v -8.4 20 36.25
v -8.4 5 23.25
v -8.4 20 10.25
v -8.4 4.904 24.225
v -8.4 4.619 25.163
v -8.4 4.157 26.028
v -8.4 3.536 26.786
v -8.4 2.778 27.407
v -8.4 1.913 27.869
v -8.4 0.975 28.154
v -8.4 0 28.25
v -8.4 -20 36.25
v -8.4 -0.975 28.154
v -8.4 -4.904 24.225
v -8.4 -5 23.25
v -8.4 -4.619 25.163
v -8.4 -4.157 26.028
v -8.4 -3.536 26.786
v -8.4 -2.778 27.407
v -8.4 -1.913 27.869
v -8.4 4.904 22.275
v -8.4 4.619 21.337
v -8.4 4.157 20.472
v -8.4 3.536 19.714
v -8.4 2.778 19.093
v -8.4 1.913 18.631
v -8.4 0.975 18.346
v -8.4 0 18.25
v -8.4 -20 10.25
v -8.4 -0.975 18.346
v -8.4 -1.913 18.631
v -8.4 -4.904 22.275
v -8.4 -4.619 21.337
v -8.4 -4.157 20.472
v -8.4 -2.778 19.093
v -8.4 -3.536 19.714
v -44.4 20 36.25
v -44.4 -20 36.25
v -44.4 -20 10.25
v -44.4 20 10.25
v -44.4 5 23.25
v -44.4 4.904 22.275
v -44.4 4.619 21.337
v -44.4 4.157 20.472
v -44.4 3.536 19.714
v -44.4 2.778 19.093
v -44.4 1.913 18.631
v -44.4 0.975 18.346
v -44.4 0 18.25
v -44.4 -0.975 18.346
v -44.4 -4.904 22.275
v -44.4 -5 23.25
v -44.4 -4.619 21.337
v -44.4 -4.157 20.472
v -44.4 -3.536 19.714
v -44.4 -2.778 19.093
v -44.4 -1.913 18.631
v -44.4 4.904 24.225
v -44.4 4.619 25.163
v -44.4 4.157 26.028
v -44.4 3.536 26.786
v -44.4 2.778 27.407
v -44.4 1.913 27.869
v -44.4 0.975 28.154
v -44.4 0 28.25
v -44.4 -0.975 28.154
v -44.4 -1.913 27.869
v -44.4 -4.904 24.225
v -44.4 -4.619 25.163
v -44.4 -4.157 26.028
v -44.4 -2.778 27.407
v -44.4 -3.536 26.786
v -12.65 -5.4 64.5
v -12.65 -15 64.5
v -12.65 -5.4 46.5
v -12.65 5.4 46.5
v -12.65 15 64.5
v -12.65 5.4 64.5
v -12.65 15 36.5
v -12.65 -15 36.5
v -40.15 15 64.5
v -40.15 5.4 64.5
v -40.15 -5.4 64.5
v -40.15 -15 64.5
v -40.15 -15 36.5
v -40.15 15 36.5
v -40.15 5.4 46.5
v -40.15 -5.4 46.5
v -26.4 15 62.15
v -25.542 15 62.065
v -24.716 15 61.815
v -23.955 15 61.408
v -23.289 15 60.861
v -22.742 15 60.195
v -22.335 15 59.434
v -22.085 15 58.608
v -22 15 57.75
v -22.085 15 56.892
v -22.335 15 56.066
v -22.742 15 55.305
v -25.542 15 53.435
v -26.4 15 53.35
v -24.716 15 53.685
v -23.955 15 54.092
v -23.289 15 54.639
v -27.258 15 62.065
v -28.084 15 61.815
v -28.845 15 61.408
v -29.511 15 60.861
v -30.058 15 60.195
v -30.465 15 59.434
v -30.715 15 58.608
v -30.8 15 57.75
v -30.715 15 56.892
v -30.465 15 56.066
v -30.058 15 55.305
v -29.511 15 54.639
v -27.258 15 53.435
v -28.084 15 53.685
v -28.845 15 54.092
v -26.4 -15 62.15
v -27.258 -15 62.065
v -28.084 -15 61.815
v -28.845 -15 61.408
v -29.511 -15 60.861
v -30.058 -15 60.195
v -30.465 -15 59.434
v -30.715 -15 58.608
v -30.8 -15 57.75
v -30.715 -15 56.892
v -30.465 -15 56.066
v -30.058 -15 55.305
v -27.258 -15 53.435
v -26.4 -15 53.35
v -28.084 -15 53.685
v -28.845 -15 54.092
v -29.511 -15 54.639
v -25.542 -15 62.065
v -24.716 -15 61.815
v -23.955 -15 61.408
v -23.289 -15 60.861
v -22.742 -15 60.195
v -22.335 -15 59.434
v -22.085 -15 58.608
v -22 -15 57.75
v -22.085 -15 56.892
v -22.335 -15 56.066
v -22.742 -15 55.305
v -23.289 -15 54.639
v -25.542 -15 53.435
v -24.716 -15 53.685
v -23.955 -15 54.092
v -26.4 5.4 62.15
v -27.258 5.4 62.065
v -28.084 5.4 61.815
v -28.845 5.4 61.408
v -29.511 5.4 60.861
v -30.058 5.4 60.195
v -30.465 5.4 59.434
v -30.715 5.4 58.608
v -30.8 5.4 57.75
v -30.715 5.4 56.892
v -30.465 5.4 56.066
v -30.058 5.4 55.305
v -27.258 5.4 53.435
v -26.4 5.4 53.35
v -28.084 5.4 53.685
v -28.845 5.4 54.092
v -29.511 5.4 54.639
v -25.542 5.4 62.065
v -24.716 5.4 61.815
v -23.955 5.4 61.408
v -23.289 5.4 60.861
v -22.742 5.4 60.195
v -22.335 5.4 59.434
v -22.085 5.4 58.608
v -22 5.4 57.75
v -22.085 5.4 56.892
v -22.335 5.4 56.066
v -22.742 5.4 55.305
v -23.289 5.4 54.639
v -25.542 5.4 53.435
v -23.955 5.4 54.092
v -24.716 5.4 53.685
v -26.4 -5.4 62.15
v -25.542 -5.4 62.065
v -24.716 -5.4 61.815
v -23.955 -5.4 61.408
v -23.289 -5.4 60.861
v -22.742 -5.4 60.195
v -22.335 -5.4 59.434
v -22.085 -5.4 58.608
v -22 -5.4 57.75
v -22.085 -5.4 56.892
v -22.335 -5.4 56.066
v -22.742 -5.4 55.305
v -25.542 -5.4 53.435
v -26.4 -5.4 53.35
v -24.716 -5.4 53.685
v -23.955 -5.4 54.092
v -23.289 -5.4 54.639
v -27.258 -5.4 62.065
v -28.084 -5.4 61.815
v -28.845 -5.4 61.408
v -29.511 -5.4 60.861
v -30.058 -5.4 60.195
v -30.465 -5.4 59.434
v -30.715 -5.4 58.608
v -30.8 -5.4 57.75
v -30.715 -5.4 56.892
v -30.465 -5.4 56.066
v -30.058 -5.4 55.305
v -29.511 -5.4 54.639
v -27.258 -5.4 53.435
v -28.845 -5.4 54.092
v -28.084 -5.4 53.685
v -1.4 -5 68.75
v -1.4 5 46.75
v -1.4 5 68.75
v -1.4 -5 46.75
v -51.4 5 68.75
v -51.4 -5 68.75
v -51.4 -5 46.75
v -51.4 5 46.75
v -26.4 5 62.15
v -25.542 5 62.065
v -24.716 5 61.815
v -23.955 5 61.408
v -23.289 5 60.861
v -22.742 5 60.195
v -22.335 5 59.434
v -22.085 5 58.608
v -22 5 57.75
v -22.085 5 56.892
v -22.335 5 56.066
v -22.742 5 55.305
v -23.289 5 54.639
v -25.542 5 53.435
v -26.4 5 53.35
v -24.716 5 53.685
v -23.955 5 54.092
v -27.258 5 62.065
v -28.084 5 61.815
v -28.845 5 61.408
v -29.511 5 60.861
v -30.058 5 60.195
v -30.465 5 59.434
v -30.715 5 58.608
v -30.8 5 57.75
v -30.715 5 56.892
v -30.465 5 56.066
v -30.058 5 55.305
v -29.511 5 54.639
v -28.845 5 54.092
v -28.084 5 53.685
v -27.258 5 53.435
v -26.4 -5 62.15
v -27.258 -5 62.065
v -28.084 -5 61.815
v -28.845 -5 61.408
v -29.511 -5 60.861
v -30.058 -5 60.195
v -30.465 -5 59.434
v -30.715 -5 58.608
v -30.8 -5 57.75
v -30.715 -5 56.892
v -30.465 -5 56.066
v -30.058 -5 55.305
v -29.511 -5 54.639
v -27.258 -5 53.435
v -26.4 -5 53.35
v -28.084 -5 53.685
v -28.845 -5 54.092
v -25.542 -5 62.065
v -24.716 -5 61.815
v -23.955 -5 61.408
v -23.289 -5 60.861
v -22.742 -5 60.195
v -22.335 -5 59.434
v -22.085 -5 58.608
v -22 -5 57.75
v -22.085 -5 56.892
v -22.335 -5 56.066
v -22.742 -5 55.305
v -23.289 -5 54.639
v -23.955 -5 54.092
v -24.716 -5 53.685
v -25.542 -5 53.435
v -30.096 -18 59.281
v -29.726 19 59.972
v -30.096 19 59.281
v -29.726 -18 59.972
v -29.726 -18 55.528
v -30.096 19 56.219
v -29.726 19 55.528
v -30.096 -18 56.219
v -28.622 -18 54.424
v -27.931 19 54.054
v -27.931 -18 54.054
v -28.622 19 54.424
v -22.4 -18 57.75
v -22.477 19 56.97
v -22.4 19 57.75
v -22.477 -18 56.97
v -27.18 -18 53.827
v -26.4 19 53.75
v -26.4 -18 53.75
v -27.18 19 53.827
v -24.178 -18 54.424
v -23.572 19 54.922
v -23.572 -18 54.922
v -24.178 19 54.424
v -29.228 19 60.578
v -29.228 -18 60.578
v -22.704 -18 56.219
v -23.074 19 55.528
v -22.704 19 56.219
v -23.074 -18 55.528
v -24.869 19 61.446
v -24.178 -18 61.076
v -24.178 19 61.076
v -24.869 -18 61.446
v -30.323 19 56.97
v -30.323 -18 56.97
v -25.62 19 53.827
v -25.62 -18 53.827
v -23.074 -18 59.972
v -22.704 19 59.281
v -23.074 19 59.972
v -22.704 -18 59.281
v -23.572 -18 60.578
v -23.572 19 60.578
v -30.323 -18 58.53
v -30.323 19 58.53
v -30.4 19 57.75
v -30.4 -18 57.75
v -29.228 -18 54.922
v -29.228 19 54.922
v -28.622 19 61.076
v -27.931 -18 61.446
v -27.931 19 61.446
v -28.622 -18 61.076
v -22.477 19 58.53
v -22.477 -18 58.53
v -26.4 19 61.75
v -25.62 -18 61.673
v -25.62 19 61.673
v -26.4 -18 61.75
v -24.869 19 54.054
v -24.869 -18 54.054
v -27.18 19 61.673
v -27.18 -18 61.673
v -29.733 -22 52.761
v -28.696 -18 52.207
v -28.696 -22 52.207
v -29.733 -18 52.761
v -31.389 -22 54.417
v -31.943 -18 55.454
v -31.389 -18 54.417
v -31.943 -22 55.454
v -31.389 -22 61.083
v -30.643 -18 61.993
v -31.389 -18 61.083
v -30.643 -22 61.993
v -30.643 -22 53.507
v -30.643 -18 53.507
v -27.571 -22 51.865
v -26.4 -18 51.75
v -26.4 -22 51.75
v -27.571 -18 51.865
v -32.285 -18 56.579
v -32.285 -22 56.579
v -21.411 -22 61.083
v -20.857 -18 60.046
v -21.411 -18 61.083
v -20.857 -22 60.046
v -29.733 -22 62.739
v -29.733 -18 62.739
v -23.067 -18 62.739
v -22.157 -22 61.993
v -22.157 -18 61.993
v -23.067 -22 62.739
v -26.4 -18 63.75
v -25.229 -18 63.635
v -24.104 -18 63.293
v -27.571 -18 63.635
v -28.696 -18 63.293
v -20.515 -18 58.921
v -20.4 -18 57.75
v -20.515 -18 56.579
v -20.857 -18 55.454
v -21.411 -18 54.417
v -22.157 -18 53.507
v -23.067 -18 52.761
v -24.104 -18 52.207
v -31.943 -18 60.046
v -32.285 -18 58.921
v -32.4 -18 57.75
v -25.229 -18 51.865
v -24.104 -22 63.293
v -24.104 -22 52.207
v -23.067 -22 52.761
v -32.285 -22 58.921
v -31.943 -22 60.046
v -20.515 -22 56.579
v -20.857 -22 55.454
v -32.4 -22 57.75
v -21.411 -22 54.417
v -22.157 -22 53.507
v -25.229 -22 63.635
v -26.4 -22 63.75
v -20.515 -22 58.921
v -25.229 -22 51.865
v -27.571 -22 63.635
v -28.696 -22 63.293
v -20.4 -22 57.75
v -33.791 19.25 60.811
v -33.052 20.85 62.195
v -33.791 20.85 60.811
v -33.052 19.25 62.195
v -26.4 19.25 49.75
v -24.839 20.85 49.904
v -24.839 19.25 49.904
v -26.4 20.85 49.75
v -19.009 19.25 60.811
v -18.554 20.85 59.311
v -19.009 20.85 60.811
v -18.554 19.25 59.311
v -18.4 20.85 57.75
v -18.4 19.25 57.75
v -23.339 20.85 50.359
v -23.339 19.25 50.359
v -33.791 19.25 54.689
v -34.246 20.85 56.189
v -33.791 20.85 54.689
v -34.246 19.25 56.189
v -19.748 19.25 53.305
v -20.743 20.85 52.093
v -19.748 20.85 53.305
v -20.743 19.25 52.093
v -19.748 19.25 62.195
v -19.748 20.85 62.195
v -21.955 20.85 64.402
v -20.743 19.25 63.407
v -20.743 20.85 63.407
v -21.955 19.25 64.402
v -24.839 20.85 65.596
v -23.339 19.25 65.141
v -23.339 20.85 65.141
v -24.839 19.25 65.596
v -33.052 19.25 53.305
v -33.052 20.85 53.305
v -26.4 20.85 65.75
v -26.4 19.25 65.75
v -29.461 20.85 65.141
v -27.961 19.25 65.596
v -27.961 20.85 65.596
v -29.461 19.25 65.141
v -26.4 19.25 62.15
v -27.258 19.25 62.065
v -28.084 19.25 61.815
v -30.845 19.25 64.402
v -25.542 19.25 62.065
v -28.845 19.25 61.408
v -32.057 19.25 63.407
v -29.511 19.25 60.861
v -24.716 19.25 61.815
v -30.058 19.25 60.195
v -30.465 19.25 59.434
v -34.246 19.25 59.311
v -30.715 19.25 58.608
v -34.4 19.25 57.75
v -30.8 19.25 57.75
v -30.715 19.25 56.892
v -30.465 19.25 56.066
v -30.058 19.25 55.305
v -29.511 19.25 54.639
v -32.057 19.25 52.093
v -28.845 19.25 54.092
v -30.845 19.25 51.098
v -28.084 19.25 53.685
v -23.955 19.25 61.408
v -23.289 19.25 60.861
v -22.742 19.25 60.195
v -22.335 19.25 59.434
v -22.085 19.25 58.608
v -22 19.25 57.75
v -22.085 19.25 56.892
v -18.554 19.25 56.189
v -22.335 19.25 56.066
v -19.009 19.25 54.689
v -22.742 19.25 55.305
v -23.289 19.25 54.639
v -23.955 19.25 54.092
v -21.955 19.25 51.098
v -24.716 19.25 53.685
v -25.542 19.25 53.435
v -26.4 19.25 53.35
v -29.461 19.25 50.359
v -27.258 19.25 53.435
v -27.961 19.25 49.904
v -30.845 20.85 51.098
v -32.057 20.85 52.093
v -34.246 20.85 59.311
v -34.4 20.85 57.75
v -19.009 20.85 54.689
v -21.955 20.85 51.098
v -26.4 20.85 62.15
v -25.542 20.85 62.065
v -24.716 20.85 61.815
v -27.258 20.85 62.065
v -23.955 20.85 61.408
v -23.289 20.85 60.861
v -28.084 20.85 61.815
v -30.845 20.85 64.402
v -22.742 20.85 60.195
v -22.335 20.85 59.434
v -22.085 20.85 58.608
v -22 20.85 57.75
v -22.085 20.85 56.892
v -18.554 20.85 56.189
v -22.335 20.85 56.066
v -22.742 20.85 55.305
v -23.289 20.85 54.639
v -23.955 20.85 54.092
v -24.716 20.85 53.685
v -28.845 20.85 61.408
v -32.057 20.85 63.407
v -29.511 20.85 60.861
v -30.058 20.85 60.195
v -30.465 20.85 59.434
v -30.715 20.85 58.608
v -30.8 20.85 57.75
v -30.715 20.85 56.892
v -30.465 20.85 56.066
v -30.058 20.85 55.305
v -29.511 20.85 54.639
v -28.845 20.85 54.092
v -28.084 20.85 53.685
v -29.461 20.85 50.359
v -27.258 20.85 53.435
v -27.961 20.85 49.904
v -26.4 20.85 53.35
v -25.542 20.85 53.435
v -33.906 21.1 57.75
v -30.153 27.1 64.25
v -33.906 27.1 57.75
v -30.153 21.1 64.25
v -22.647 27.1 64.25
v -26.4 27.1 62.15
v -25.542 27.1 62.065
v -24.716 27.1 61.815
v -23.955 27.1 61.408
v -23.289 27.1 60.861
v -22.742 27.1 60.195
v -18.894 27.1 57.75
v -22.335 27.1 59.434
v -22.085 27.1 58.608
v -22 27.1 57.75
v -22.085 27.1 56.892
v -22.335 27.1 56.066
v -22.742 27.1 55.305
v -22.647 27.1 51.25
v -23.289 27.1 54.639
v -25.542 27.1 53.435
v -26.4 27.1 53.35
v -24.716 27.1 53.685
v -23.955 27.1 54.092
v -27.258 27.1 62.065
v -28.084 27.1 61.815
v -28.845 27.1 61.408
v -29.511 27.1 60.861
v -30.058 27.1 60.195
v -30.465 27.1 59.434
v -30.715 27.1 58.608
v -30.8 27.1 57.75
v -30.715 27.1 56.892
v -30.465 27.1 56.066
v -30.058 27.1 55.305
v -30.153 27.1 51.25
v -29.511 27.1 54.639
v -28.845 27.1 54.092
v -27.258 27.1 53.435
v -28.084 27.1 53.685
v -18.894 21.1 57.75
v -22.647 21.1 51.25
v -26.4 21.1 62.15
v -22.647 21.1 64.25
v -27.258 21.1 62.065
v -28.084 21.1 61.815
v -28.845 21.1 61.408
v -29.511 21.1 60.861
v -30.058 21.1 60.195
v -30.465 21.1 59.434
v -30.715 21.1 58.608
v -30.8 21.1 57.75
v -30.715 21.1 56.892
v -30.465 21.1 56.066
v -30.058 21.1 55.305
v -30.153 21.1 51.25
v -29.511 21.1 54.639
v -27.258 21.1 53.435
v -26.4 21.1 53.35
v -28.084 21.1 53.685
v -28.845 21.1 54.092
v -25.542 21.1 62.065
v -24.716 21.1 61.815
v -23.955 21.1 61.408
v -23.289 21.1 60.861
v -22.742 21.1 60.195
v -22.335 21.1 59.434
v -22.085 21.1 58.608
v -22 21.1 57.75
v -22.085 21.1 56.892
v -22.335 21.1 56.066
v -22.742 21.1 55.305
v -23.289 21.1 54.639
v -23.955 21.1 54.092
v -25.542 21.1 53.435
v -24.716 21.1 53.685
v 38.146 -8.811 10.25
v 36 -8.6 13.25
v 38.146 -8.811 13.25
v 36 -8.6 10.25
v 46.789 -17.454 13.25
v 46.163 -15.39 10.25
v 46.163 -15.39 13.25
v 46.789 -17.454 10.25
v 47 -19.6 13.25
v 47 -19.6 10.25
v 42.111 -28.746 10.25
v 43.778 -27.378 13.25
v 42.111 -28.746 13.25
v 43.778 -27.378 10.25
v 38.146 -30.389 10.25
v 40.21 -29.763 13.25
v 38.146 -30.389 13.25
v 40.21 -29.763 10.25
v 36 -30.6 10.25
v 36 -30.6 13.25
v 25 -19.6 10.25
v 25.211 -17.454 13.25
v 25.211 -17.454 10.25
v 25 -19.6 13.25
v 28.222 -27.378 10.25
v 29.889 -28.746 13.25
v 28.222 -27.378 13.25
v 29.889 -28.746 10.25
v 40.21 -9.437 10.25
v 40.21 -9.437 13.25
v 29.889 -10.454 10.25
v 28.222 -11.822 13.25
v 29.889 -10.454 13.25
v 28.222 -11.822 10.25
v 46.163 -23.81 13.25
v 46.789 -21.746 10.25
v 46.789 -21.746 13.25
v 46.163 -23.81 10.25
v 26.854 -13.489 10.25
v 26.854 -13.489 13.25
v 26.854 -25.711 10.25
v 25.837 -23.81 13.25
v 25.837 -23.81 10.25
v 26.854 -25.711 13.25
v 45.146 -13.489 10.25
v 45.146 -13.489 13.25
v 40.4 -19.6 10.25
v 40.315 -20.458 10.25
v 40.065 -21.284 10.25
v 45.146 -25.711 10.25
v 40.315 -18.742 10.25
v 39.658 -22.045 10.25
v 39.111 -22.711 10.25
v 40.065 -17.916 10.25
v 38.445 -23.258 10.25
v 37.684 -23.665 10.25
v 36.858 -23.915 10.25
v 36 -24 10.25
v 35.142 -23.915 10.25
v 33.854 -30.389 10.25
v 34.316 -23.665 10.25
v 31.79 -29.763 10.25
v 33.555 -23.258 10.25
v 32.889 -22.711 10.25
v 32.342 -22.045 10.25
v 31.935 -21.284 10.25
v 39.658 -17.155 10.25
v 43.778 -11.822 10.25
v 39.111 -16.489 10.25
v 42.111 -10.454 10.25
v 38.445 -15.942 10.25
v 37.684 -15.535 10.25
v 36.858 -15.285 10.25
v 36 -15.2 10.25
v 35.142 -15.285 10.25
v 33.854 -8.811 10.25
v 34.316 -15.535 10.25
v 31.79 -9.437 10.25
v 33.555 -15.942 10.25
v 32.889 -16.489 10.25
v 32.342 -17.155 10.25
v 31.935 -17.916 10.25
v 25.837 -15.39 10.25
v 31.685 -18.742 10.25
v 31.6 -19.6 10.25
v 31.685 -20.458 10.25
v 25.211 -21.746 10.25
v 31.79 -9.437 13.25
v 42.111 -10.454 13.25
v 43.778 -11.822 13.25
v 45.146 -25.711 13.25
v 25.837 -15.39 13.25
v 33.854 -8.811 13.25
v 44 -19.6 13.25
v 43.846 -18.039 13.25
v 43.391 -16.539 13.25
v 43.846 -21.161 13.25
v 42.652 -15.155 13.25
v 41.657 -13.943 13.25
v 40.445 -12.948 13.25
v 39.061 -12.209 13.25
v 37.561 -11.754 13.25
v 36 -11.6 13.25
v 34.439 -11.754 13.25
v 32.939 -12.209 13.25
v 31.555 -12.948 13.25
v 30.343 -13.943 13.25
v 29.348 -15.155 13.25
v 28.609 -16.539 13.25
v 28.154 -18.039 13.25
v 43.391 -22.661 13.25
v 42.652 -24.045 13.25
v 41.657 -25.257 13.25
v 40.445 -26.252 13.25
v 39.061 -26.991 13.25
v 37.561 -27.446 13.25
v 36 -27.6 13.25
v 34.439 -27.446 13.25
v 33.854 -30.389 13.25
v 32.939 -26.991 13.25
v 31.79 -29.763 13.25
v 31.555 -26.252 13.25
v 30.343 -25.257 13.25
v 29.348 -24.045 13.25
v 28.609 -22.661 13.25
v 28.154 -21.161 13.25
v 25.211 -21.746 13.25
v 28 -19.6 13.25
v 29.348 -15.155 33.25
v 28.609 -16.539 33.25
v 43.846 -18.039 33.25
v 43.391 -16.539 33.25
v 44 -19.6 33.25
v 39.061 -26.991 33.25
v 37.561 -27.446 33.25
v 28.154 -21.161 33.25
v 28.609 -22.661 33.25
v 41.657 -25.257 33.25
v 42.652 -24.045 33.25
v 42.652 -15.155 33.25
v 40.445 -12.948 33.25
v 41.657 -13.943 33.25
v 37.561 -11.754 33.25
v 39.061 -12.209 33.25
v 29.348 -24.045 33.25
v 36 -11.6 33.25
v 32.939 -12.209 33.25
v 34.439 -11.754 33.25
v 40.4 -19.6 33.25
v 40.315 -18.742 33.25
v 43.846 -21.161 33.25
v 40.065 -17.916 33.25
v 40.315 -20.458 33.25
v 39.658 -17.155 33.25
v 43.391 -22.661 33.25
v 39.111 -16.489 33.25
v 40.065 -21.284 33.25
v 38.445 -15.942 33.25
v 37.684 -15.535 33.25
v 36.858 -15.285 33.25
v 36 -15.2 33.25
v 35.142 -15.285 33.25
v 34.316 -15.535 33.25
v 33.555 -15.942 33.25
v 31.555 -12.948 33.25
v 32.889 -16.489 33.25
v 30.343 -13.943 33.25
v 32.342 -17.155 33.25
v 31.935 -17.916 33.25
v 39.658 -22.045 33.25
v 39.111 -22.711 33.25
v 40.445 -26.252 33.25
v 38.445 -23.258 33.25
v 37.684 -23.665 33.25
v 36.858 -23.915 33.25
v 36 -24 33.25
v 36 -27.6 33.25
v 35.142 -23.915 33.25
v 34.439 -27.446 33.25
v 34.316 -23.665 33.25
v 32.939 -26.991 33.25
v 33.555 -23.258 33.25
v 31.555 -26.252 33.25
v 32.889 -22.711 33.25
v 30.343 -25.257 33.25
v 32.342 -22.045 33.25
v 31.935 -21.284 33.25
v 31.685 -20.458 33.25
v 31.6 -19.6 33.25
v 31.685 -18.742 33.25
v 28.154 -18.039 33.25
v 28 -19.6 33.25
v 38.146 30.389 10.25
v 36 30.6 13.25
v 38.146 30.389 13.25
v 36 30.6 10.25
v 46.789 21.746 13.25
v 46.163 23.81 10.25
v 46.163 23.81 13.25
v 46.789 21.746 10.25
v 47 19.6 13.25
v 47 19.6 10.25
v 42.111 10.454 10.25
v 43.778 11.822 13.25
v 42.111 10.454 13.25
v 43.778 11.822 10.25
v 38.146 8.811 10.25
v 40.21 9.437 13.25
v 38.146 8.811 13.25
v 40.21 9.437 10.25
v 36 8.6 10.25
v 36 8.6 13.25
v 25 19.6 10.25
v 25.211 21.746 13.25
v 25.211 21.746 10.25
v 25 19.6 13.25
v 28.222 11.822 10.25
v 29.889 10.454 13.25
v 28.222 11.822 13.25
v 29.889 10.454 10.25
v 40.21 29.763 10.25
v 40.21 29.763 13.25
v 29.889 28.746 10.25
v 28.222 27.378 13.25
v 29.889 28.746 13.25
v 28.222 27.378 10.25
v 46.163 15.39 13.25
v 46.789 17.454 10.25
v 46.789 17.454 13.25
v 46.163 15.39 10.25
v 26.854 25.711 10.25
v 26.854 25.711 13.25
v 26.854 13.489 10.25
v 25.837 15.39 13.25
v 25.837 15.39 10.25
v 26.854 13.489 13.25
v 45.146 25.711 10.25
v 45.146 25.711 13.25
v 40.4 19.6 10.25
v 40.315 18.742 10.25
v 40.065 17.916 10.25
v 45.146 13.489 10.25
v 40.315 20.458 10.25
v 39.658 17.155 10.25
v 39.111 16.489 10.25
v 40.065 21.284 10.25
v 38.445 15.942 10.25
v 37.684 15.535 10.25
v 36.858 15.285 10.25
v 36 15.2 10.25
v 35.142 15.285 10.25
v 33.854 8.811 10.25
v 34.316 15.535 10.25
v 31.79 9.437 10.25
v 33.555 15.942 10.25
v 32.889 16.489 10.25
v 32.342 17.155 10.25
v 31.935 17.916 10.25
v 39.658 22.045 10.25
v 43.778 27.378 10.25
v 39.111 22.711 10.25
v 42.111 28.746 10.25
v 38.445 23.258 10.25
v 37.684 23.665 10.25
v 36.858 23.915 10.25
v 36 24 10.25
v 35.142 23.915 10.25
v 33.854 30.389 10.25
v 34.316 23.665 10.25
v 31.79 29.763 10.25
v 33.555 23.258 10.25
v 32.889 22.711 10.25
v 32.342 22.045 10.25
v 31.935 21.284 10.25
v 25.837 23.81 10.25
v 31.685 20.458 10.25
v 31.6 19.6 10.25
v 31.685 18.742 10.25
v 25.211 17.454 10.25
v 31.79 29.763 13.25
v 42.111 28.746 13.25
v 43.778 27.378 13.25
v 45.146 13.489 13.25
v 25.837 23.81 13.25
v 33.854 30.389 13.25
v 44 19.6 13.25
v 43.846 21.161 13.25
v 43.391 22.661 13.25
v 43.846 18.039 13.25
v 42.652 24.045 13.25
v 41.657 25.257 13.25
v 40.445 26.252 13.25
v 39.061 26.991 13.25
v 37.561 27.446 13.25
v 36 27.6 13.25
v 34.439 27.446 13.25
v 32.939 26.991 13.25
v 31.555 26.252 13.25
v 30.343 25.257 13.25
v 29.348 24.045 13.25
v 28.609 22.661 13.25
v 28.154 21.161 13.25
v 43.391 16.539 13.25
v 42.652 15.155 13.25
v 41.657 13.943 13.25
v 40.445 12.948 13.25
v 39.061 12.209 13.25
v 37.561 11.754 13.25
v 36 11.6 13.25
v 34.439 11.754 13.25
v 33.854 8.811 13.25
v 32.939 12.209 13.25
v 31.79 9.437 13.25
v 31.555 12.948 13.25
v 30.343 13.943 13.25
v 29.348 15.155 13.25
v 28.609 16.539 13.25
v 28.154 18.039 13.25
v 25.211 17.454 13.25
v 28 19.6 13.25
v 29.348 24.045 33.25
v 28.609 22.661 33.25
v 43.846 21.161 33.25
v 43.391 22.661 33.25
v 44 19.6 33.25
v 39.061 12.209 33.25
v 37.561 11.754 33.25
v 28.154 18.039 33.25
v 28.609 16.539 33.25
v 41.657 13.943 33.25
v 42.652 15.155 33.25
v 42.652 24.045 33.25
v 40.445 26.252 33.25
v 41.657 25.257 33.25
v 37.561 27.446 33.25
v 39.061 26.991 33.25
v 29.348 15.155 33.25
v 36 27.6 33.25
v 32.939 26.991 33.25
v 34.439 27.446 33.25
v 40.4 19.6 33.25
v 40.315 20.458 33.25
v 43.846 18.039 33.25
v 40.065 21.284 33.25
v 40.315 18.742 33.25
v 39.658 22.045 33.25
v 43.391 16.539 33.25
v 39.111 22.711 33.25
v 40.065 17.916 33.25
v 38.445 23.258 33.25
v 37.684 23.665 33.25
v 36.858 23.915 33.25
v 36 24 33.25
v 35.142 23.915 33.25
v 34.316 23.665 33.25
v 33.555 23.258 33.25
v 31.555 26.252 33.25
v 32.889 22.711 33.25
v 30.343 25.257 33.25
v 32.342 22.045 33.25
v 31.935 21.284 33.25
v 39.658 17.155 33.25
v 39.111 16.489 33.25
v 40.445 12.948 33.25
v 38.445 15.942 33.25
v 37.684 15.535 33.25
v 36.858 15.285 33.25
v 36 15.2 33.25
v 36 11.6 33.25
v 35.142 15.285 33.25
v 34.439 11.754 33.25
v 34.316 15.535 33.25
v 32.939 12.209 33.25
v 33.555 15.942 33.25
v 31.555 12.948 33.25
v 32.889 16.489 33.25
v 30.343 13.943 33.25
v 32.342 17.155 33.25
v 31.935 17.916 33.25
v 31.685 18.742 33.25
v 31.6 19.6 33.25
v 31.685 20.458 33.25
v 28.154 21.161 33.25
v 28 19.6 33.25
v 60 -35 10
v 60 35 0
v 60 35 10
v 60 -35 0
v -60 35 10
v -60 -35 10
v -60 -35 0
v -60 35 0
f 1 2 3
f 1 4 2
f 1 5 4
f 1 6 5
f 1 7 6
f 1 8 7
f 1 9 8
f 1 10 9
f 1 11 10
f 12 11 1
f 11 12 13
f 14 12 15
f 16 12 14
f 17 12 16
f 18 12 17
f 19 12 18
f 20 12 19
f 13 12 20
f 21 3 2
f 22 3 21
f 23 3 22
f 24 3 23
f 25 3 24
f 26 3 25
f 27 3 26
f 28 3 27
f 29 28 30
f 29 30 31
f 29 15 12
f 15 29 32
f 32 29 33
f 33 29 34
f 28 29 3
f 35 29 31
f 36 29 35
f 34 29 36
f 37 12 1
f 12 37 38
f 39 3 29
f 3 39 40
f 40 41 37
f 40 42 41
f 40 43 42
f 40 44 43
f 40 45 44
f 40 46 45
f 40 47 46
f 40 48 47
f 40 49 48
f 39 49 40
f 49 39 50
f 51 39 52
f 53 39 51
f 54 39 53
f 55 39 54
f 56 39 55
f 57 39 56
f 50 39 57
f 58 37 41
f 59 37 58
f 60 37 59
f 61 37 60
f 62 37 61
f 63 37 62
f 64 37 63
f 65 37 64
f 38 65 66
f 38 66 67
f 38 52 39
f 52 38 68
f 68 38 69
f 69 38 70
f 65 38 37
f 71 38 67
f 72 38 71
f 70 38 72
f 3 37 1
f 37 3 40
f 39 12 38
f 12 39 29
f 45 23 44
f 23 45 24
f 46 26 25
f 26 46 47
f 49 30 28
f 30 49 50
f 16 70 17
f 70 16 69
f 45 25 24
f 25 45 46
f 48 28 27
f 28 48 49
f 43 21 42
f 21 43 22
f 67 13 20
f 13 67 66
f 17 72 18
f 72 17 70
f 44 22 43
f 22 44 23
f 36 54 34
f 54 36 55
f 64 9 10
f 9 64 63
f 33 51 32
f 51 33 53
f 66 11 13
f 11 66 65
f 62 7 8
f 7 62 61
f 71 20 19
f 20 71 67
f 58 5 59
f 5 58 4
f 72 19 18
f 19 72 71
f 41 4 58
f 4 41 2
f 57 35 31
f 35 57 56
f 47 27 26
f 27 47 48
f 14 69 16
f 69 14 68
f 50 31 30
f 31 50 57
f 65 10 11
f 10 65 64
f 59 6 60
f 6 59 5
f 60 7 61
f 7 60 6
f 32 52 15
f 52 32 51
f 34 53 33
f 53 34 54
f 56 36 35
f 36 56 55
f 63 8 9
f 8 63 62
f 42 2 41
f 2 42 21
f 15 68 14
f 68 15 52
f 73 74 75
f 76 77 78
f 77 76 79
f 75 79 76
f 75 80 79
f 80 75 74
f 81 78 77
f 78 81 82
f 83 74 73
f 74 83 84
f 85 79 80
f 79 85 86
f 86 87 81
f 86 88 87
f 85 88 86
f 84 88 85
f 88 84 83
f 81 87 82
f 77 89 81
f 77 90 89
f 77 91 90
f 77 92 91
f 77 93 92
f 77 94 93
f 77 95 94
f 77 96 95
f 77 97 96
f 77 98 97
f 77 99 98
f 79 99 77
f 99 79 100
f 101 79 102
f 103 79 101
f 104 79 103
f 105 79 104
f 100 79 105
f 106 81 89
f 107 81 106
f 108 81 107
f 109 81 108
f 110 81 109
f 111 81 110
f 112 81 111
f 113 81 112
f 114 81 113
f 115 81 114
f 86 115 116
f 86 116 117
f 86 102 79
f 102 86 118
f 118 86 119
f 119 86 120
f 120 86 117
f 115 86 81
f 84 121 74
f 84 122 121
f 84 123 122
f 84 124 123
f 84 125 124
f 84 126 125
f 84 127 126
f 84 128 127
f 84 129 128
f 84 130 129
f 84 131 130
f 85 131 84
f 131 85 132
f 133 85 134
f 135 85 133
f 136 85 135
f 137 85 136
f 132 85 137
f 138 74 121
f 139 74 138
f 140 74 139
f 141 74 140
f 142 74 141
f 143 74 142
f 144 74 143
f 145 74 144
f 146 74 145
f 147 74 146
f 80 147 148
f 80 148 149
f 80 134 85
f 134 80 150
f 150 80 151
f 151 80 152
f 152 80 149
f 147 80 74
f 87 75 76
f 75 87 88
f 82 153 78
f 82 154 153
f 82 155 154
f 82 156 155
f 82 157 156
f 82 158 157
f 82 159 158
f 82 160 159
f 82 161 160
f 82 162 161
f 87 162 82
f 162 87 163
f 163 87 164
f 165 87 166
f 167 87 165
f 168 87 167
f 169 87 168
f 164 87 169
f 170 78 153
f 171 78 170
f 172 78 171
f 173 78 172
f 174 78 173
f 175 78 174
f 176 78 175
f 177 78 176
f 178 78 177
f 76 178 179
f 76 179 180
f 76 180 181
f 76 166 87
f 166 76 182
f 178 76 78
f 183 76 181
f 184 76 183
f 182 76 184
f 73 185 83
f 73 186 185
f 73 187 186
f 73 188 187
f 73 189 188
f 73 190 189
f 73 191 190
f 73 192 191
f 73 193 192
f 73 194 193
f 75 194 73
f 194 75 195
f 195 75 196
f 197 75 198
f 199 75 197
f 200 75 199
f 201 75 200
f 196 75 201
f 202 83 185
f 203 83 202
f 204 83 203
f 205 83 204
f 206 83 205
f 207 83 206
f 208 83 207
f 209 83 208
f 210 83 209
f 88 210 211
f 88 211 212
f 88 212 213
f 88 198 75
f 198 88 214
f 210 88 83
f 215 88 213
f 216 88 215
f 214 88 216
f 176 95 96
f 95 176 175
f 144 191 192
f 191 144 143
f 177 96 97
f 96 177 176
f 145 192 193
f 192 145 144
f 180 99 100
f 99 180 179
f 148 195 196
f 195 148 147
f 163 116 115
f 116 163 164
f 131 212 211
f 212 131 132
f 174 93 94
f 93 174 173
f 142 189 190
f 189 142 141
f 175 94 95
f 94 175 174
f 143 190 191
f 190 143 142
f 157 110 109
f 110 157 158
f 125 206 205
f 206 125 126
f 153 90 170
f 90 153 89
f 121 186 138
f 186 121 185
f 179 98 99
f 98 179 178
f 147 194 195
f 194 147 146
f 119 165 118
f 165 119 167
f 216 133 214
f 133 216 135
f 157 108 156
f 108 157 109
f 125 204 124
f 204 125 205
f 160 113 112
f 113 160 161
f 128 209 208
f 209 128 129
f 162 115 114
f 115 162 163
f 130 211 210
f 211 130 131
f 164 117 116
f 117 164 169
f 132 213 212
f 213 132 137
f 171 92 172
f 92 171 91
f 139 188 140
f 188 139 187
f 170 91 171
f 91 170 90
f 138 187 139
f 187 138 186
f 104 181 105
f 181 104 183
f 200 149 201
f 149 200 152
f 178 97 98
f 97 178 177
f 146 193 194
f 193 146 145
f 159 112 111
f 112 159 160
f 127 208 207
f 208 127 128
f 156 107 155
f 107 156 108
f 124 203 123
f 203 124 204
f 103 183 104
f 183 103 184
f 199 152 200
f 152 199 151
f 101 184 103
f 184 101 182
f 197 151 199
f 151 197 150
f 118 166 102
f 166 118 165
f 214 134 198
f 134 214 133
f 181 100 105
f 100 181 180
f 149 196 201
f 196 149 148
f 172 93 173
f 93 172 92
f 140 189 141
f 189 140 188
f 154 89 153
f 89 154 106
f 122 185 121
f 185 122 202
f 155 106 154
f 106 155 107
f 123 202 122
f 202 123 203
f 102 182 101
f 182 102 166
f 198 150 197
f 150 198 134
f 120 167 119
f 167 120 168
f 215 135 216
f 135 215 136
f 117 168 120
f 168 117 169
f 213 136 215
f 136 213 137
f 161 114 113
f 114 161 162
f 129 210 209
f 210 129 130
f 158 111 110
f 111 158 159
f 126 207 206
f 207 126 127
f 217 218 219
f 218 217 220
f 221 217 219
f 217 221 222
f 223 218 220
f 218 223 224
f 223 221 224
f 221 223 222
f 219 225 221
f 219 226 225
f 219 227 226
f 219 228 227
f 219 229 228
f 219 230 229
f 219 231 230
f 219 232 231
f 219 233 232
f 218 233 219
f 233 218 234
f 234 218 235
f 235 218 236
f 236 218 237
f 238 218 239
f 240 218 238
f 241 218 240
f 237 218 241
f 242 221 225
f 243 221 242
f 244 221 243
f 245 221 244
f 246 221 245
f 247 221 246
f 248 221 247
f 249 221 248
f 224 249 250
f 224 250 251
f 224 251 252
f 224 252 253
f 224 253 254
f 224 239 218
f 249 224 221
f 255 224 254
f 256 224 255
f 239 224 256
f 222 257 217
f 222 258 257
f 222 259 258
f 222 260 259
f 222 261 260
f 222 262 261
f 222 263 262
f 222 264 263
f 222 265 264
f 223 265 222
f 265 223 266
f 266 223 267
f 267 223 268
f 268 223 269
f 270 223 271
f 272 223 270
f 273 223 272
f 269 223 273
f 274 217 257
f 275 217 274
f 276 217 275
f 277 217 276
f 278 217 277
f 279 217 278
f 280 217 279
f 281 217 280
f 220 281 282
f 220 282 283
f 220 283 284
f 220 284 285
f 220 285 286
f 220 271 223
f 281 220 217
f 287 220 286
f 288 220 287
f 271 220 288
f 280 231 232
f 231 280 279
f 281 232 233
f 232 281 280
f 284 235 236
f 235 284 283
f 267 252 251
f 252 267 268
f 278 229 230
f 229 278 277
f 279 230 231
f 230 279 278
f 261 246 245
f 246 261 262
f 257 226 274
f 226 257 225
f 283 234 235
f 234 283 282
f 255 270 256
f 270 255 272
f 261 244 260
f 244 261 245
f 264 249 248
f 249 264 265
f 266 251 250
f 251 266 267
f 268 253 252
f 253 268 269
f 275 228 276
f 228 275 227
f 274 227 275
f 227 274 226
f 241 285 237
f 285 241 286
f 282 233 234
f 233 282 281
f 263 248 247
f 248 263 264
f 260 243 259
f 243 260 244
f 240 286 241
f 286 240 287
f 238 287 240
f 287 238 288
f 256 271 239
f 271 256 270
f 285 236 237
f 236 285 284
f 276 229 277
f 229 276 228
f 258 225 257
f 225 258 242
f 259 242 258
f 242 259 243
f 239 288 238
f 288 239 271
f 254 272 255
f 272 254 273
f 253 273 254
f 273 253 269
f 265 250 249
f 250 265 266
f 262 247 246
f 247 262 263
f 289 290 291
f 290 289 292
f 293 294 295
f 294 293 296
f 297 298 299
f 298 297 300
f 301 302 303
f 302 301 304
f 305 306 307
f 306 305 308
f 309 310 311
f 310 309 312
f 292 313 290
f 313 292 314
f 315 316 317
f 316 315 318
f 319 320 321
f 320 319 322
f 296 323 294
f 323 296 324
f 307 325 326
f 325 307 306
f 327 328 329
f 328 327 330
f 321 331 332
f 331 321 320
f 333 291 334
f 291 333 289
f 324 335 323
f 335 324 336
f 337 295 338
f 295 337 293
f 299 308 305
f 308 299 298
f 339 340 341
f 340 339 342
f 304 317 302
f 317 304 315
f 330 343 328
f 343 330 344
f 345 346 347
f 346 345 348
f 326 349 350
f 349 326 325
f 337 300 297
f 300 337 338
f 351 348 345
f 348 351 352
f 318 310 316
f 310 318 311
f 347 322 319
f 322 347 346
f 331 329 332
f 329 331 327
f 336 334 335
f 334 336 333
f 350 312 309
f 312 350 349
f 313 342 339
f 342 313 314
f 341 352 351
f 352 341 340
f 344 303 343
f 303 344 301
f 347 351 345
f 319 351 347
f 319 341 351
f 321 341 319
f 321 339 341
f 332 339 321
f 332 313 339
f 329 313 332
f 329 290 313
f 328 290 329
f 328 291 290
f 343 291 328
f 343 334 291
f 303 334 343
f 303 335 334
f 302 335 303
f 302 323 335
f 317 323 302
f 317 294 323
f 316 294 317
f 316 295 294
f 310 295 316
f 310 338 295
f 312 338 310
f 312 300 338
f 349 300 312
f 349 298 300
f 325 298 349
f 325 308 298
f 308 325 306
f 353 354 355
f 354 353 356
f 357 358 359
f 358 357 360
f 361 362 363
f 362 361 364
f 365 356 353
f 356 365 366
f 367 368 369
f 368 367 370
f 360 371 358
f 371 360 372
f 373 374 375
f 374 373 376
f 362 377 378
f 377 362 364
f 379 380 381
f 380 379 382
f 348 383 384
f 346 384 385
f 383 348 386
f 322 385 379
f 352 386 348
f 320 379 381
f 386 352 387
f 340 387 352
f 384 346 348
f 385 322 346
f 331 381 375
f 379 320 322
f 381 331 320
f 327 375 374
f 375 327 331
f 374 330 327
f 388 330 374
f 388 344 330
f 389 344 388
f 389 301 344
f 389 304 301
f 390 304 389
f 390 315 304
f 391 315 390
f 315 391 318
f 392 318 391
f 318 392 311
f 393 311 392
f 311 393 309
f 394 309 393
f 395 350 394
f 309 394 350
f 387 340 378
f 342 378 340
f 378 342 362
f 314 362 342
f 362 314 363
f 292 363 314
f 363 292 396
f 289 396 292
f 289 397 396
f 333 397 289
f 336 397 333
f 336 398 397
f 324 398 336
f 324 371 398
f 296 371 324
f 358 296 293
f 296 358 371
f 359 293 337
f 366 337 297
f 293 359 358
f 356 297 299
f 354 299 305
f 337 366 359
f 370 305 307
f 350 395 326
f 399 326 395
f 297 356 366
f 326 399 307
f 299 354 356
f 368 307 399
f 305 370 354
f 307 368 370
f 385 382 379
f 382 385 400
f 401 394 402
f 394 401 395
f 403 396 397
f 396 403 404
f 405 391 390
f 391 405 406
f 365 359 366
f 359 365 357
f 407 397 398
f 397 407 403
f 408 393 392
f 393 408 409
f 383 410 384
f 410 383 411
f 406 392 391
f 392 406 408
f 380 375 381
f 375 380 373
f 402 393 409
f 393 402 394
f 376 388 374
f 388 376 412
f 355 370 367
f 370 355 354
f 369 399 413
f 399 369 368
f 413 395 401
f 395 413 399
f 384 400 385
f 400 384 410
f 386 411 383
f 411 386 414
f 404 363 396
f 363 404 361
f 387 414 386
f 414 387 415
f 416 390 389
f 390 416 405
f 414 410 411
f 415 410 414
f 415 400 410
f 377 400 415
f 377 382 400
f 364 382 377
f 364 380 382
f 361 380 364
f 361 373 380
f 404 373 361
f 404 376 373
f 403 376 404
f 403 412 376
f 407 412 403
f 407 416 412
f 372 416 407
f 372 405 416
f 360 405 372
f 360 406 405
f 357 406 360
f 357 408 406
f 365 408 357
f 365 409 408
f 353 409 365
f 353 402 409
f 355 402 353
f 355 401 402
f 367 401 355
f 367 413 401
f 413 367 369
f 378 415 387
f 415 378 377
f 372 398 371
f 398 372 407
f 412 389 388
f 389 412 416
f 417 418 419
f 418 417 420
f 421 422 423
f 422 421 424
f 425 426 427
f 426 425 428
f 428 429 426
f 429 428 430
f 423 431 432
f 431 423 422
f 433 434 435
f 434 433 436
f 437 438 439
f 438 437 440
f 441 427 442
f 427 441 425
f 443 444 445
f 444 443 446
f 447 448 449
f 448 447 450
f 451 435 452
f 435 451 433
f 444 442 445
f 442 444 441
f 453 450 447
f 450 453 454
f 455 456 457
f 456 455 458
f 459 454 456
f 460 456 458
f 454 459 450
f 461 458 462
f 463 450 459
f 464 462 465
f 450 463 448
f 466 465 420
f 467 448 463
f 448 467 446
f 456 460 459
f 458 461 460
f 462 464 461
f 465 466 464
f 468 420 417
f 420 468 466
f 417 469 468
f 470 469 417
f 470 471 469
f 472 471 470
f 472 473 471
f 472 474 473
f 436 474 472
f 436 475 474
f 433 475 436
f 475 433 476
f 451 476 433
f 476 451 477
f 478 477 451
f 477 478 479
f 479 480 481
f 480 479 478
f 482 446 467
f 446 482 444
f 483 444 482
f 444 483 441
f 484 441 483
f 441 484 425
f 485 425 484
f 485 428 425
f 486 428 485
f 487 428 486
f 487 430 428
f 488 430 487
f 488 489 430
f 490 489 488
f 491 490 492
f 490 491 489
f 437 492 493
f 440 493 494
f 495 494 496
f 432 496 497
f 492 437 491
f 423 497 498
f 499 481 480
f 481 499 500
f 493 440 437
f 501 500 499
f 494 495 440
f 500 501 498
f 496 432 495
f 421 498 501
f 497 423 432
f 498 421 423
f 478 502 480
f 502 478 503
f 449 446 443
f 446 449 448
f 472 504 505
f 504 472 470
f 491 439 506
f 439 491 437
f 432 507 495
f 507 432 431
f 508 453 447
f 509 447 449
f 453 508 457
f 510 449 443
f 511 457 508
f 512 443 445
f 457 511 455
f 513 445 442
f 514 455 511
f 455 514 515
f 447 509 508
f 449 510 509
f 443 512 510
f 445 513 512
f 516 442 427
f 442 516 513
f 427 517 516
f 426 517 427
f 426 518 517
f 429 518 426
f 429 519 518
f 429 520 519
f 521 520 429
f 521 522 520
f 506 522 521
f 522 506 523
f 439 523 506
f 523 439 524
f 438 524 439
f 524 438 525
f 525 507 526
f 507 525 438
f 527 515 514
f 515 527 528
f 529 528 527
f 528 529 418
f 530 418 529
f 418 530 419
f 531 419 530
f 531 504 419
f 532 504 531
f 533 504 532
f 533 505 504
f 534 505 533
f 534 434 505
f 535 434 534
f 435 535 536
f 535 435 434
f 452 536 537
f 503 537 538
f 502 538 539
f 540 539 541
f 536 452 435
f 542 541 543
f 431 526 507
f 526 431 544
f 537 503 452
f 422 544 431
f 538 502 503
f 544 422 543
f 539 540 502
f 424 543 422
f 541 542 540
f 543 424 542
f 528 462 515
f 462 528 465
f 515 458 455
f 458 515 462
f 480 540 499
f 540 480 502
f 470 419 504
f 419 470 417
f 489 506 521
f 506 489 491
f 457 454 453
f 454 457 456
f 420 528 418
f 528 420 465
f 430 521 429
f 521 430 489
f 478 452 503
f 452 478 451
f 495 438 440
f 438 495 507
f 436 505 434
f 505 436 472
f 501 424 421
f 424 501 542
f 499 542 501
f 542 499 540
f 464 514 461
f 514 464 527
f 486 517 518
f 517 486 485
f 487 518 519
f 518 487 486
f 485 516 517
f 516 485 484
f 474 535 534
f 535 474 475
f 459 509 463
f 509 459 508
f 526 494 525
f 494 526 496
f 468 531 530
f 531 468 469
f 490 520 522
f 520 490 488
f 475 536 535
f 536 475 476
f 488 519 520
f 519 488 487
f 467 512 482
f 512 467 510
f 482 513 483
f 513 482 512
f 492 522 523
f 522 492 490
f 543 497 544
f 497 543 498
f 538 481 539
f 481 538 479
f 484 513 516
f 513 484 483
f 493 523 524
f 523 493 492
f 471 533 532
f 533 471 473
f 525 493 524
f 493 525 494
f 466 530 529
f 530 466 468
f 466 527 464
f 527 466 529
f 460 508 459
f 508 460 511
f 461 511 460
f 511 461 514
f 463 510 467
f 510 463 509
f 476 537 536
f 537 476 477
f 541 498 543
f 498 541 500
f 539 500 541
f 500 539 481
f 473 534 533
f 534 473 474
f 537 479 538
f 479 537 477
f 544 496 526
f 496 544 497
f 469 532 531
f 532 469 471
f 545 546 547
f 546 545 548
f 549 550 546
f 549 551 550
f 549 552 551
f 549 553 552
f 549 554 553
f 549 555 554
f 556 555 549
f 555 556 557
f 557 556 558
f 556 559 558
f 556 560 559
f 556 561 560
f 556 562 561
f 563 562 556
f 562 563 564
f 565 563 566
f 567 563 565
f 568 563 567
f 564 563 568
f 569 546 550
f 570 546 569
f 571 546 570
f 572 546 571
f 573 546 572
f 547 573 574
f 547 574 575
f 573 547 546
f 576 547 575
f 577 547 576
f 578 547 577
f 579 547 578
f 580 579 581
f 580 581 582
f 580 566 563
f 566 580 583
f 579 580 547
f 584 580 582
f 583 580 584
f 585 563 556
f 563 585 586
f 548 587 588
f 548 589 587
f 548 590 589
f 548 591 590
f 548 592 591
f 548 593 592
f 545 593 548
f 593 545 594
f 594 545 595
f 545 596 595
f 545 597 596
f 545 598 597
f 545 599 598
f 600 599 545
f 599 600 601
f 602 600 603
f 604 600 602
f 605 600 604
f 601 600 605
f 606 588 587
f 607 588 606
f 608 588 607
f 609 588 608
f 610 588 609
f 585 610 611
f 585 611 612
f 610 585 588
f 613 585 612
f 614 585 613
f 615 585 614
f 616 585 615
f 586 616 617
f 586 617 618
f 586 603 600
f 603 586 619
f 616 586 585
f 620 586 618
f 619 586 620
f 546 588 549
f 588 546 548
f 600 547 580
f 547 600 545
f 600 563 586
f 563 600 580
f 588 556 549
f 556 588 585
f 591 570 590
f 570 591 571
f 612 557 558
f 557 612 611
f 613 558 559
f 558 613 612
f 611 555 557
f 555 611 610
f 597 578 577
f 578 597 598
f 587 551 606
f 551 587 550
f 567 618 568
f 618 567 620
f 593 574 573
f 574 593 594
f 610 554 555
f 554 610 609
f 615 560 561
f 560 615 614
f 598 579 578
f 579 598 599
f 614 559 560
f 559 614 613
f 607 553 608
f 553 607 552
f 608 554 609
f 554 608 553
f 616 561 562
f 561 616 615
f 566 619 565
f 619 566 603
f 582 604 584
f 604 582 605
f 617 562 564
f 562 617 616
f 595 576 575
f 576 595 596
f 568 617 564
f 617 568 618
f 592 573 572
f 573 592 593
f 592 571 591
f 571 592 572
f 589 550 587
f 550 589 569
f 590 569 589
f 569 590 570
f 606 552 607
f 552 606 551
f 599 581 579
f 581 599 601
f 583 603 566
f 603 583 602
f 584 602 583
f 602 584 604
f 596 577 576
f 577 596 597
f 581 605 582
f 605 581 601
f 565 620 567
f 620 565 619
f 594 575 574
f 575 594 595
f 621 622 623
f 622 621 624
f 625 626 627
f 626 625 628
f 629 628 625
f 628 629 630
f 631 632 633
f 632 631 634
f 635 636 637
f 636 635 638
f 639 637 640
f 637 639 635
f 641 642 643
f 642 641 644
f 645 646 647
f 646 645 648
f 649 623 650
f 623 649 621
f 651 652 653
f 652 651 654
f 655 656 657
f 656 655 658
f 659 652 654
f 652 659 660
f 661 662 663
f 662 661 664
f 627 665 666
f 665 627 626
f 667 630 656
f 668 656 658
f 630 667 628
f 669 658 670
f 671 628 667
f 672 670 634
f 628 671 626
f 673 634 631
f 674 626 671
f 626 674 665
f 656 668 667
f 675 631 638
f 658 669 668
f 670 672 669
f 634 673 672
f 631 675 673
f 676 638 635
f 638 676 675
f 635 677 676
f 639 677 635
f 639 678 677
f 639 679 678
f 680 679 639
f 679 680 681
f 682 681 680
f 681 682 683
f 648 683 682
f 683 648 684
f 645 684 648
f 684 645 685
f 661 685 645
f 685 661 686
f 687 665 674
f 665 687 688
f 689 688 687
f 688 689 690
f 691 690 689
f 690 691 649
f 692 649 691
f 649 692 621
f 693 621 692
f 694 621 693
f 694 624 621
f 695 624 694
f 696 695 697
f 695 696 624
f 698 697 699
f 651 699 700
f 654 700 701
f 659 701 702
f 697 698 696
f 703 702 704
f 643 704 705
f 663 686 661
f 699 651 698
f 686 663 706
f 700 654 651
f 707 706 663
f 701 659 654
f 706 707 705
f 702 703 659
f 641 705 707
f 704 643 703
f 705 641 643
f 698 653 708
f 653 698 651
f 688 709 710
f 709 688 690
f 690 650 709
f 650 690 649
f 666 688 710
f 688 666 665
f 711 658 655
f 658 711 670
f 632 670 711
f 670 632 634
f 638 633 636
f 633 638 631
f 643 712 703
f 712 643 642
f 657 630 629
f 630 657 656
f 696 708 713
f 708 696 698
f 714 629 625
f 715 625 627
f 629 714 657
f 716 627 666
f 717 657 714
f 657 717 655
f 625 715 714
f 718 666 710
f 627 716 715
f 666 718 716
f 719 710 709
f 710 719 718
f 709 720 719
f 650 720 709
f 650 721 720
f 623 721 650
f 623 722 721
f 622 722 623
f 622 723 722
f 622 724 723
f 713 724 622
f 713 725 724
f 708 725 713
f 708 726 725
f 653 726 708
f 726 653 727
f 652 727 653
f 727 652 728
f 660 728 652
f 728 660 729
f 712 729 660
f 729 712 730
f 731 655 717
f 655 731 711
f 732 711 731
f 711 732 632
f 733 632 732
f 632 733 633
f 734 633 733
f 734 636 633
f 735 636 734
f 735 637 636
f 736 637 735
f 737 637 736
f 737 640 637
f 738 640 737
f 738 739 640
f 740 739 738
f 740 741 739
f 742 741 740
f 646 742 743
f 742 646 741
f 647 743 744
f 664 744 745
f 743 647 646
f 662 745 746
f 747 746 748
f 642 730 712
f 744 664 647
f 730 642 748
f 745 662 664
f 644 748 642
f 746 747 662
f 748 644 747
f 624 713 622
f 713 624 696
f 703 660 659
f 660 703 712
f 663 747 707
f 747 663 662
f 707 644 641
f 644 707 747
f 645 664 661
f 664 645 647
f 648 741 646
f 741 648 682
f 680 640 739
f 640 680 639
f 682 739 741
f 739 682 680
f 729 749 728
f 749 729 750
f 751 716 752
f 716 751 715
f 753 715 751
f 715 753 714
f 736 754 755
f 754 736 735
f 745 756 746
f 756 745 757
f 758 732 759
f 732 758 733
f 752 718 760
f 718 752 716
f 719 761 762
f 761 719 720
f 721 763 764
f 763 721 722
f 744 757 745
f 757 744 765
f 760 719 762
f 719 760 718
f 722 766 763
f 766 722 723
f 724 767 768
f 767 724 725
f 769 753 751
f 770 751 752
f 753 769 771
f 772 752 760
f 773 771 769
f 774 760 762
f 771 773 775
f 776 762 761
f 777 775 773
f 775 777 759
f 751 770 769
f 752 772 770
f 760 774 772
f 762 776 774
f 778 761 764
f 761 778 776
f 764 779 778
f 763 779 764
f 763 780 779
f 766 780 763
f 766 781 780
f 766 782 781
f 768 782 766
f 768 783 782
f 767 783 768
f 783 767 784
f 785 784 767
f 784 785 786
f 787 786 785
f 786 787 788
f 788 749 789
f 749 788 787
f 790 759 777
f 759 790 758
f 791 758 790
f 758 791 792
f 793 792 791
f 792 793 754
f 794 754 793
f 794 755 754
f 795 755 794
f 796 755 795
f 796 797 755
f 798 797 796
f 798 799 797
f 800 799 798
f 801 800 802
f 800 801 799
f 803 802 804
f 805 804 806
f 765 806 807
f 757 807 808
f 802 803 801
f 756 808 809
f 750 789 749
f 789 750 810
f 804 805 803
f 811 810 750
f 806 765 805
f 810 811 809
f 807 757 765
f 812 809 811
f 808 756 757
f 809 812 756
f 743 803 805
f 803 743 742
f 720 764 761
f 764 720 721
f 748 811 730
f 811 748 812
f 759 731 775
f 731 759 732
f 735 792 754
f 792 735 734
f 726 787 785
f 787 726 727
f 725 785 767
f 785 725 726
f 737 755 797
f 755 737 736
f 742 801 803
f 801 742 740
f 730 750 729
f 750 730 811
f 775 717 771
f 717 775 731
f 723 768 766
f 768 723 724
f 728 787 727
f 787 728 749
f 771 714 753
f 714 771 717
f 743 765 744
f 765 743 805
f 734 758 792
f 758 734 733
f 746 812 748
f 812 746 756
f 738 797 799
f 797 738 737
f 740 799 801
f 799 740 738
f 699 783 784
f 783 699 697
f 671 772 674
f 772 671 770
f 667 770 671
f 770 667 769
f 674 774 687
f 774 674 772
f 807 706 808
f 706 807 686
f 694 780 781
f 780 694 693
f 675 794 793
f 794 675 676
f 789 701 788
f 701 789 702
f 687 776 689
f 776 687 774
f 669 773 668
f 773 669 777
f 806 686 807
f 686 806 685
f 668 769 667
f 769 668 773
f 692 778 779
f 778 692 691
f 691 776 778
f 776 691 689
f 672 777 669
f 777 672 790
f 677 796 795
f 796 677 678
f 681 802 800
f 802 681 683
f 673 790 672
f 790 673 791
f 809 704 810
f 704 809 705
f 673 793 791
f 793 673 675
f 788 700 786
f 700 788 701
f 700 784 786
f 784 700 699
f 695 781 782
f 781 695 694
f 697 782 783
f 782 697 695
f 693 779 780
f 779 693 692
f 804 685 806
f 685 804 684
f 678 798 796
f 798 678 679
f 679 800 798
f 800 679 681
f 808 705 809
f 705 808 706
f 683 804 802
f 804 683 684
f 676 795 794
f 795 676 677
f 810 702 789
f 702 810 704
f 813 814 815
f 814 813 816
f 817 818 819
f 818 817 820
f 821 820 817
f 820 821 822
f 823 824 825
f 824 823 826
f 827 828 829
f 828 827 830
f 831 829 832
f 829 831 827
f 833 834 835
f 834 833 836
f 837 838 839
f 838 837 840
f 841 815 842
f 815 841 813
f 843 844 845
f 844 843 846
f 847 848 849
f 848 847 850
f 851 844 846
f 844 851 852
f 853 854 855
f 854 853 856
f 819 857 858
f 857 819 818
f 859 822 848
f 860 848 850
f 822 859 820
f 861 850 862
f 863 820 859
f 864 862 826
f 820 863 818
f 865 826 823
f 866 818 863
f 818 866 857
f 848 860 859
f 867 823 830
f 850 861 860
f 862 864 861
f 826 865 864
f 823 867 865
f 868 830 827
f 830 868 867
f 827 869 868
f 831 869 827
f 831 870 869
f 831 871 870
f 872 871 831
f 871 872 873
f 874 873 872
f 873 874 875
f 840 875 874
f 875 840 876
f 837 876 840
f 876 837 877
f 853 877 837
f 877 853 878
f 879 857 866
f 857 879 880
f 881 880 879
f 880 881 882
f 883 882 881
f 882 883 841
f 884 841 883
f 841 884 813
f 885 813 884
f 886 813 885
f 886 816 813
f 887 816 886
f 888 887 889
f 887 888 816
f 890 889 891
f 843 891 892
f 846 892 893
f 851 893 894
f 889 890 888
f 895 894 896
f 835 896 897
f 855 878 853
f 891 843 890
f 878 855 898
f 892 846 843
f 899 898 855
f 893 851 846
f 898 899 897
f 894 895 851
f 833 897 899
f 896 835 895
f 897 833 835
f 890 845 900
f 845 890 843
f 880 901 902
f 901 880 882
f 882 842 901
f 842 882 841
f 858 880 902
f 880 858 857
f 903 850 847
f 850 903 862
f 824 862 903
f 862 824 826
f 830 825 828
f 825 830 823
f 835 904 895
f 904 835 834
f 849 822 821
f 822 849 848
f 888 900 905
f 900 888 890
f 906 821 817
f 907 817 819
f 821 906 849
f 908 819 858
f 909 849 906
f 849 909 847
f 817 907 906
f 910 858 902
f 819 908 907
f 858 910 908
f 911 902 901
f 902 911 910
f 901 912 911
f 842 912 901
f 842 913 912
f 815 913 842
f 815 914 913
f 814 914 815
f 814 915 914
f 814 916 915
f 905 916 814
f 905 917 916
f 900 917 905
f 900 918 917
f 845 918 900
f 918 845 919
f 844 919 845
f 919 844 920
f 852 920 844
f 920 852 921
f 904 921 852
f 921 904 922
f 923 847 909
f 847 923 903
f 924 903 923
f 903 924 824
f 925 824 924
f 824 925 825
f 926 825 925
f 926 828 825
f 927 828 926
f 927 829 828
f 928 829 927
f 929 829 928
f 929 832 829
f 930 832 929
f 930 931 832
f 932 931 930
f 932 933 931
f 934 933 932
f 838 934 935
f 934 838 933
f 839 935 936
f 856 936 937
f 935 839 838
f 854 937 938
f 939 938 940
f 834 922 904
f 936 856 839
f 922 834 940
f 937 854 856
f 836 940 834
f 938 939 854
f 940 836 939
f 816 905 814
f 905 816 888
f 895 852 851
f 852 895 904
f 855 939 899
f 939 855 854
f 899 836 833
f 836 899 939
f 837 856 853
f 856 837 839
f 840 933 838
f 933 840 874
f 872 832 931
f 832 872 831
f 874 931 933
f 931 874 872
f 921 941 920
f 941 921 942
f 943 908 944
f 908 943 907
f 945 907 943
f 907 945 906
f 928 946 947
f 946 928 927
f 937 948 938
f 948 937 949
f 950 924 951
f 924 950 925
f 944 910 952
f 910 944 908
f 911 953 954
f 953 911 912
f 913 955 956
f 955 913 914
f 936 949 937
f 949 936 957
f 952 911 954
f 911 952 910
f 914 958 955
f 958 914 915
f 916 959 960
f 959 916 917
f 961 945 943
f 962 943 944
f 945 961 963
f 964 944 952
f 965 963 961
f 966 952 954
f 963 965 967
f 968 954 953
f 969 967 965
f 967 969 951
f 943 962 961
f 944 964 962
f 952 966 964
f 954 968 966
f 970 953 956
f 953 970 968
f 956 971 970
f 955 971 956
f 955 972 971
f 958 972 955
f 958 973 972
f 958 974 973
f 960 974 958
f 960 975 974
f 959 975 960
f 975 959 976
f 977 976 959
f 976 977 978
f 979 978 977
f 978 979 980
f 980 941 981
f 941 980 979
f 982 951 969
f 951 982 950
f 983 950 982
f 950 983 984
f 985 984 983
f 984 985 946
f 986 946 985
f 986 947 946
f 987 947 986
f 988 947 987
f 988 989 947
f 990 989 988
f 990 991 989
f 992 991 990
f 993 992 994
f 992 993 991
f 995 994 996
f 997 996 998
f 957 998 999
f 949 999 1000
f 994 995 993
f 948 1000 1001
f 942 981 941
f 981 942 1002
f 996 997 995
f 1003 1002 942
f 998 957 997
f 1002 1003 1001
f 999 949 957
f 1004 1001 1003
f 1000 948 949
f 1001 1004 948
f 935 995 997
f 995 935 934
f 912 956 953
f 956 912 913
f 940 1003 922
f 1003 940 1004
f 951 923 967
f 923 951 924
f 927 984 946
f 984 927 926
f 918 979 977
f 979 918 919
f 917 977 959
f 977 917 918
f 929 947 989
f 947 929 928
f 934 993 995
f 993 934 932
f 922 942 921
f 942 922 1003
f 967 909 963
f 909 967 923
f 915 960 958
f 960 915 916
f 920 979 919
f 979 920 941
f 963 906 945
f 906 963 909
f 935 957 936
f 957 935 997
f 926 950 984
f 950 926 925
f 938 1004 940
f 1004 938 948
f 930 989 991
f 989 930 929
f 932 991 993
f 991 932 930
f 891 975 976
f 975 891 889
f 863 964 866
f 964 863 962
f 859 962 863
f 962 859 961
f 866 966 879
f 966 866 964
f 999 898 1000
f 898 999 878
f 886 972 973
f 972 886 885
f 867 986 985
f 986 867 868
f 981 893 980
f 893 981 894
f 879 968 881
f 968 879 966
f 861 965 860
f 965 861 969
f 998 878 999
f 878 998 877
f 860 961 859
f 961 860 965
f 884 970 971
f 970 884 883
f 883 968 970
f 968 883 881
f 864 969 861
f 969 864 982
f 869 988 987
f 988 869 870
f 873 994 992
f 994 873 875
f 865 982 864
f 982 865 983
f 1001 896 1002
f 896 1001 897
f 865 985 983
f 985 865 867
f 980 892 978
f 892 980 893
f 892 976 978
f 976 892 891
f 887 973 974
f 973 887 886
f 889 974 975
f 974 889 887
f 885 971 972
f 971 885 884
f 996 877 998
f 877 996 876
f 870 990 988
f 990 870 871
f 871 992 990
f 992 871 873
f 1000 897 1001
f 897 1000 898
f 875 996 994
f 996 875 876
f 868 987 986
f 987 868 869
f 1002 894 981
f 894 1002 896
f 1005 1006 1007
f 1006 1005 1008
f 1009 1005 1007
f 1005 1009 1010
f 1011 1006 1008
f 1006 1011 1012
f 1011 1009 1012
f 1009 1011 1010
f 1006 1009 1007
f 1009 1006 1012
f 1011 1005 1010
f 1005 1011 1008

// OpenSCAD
$fn = 32;

// ------------------------------------------------------------------------
// Indexing jig: plate 120 x 70 mm, pin d8
// Every part is its own module, assembly() places every instance.
// ------------------------------------------------------------------------

// --- part 1 ---
module jig_plate() {
  difference() {
    translate([-60, -35, 0]) cube([120, 70, 10]);
  }
}

// --- part 2 ---
module locator_block() {
  difference() {
    translate([-18, -20, 0]) cube([36, 40, 26]);
    translate([0, 0, 13]) rotate([0, 90, 0]) cylinder(h = 38, d = 10, center = true);
  }
}

// --- part 3 ---
module index_fork() {
  difference() {
    translate([-13.75, -15, 0]) cube([27.5, 30, 28]);
    translate([-14.75, -5.4, 10]) cube([29.5, 10.8, 19]);
    translate([0, 0, 21.25]) rotate([90, 0, 0]) cylinder(h = 32, d = 8.8, center = true);
  }
}

// --- part 4 ---
module index_arm() {
  difference() {
    translate([-25, -5, 0]) cube([50, 10, 22]);
    translate([0, 0, 11]) rotate([90, 0, 0]) cylinder(h = 12, d = 8.8, center = true);
  }
}

// --- part 5 ---
module index_pin() {
  rotate([0, 90, 0]) cylinder(h = 38, d = 8, center = true);
  translate([-22, 0, 0]) rotate([0, 90, 0]) cylinder(h = 4, d = 12);
}

// --- part 6 ---
module pin_washer() {
  difference() {
      translate([0, 0, 0]) cylinder(h = 1.6, d = 16);
      translate([0, 0, -1]) cylinder(h = 3.6, d = 8.8);
    }
}

// --- part 7 ---
module lock_nut() {
  difference() {
    linear_extrude(height = 6) polygon(points = [[7.506, 0], [3.753, 6.5], [-3.753, 6.5], [-7.506, 0], [-3.753, -6.5], [3.753, -6.5]]);
    translate([0, 0, -1]) cylinder(h = 8, d = 8.8);
  }
}

// --- part 8 ---
module guide_bush_a() {
  difference() {
    union() {
      cylinder(h = 3, d = 22);
      translate([0, 0, 3]) cylinder(h = 20, d = 16);
    }
    translate([0, 0, -1]) cylinder(h = 25, d = 8.8);
  }
}

// --- part 9 ---
module guide_bush_b() {
  difference() {
    union() {
      cylinder(h = 3, d = 22);
      translate([0, 0, 3]) cylinder(h = 20, d = 16);
    }
    translate([0, 0, -1]) cylinder(h = 25, d = 8.8);
  }
}

// --- assembly ---
module assembly() {
  color([0.80, 0.24, 0.20]) translate([0, 0, 0]) rotate([0, 0, 0]) jig_plate();
  color([0.20, 0.45, 0.75]) translate([-26.4, 0, 10.25]) rotate([0, 0, 0]) locator_block();
  color([0.25, 0.62, 0.32]) translate([-26.4, 0, 36.5]) rotate([0, 0, 0]) index_fork();
  color([0.92, 0.70, 0.18]) translate([-26.4, 0, 46.75]) rotate([0, 0, 0]) index_arm();
  color([0.58, 0.35, 0.70]) translate([-26.4, 0, 57.75]) rotate([0, 0, 90]) index_pin();
  color([0.16, 0.66, 0.66]) translate([-26.4, 20.85, 57.75]) rotate([90, 0, 0]) pin_washer();
  color([0.85, 0.48, 0.18]) translate([-26.4, 27.1, 57.75]) rotate([90, 0, 0]) lock_nut();
  color([0.55, 0.60, 0.65]) translate([36, -19.6, 10.25]) rotate([0, 0, 0]) guide_bush_a();
  color([0.75, 0.30, 0.55]) translate([36, 19.6, 10.25]) rotate([0, 0, 0]) guide_bush_b();
}

assembly();
